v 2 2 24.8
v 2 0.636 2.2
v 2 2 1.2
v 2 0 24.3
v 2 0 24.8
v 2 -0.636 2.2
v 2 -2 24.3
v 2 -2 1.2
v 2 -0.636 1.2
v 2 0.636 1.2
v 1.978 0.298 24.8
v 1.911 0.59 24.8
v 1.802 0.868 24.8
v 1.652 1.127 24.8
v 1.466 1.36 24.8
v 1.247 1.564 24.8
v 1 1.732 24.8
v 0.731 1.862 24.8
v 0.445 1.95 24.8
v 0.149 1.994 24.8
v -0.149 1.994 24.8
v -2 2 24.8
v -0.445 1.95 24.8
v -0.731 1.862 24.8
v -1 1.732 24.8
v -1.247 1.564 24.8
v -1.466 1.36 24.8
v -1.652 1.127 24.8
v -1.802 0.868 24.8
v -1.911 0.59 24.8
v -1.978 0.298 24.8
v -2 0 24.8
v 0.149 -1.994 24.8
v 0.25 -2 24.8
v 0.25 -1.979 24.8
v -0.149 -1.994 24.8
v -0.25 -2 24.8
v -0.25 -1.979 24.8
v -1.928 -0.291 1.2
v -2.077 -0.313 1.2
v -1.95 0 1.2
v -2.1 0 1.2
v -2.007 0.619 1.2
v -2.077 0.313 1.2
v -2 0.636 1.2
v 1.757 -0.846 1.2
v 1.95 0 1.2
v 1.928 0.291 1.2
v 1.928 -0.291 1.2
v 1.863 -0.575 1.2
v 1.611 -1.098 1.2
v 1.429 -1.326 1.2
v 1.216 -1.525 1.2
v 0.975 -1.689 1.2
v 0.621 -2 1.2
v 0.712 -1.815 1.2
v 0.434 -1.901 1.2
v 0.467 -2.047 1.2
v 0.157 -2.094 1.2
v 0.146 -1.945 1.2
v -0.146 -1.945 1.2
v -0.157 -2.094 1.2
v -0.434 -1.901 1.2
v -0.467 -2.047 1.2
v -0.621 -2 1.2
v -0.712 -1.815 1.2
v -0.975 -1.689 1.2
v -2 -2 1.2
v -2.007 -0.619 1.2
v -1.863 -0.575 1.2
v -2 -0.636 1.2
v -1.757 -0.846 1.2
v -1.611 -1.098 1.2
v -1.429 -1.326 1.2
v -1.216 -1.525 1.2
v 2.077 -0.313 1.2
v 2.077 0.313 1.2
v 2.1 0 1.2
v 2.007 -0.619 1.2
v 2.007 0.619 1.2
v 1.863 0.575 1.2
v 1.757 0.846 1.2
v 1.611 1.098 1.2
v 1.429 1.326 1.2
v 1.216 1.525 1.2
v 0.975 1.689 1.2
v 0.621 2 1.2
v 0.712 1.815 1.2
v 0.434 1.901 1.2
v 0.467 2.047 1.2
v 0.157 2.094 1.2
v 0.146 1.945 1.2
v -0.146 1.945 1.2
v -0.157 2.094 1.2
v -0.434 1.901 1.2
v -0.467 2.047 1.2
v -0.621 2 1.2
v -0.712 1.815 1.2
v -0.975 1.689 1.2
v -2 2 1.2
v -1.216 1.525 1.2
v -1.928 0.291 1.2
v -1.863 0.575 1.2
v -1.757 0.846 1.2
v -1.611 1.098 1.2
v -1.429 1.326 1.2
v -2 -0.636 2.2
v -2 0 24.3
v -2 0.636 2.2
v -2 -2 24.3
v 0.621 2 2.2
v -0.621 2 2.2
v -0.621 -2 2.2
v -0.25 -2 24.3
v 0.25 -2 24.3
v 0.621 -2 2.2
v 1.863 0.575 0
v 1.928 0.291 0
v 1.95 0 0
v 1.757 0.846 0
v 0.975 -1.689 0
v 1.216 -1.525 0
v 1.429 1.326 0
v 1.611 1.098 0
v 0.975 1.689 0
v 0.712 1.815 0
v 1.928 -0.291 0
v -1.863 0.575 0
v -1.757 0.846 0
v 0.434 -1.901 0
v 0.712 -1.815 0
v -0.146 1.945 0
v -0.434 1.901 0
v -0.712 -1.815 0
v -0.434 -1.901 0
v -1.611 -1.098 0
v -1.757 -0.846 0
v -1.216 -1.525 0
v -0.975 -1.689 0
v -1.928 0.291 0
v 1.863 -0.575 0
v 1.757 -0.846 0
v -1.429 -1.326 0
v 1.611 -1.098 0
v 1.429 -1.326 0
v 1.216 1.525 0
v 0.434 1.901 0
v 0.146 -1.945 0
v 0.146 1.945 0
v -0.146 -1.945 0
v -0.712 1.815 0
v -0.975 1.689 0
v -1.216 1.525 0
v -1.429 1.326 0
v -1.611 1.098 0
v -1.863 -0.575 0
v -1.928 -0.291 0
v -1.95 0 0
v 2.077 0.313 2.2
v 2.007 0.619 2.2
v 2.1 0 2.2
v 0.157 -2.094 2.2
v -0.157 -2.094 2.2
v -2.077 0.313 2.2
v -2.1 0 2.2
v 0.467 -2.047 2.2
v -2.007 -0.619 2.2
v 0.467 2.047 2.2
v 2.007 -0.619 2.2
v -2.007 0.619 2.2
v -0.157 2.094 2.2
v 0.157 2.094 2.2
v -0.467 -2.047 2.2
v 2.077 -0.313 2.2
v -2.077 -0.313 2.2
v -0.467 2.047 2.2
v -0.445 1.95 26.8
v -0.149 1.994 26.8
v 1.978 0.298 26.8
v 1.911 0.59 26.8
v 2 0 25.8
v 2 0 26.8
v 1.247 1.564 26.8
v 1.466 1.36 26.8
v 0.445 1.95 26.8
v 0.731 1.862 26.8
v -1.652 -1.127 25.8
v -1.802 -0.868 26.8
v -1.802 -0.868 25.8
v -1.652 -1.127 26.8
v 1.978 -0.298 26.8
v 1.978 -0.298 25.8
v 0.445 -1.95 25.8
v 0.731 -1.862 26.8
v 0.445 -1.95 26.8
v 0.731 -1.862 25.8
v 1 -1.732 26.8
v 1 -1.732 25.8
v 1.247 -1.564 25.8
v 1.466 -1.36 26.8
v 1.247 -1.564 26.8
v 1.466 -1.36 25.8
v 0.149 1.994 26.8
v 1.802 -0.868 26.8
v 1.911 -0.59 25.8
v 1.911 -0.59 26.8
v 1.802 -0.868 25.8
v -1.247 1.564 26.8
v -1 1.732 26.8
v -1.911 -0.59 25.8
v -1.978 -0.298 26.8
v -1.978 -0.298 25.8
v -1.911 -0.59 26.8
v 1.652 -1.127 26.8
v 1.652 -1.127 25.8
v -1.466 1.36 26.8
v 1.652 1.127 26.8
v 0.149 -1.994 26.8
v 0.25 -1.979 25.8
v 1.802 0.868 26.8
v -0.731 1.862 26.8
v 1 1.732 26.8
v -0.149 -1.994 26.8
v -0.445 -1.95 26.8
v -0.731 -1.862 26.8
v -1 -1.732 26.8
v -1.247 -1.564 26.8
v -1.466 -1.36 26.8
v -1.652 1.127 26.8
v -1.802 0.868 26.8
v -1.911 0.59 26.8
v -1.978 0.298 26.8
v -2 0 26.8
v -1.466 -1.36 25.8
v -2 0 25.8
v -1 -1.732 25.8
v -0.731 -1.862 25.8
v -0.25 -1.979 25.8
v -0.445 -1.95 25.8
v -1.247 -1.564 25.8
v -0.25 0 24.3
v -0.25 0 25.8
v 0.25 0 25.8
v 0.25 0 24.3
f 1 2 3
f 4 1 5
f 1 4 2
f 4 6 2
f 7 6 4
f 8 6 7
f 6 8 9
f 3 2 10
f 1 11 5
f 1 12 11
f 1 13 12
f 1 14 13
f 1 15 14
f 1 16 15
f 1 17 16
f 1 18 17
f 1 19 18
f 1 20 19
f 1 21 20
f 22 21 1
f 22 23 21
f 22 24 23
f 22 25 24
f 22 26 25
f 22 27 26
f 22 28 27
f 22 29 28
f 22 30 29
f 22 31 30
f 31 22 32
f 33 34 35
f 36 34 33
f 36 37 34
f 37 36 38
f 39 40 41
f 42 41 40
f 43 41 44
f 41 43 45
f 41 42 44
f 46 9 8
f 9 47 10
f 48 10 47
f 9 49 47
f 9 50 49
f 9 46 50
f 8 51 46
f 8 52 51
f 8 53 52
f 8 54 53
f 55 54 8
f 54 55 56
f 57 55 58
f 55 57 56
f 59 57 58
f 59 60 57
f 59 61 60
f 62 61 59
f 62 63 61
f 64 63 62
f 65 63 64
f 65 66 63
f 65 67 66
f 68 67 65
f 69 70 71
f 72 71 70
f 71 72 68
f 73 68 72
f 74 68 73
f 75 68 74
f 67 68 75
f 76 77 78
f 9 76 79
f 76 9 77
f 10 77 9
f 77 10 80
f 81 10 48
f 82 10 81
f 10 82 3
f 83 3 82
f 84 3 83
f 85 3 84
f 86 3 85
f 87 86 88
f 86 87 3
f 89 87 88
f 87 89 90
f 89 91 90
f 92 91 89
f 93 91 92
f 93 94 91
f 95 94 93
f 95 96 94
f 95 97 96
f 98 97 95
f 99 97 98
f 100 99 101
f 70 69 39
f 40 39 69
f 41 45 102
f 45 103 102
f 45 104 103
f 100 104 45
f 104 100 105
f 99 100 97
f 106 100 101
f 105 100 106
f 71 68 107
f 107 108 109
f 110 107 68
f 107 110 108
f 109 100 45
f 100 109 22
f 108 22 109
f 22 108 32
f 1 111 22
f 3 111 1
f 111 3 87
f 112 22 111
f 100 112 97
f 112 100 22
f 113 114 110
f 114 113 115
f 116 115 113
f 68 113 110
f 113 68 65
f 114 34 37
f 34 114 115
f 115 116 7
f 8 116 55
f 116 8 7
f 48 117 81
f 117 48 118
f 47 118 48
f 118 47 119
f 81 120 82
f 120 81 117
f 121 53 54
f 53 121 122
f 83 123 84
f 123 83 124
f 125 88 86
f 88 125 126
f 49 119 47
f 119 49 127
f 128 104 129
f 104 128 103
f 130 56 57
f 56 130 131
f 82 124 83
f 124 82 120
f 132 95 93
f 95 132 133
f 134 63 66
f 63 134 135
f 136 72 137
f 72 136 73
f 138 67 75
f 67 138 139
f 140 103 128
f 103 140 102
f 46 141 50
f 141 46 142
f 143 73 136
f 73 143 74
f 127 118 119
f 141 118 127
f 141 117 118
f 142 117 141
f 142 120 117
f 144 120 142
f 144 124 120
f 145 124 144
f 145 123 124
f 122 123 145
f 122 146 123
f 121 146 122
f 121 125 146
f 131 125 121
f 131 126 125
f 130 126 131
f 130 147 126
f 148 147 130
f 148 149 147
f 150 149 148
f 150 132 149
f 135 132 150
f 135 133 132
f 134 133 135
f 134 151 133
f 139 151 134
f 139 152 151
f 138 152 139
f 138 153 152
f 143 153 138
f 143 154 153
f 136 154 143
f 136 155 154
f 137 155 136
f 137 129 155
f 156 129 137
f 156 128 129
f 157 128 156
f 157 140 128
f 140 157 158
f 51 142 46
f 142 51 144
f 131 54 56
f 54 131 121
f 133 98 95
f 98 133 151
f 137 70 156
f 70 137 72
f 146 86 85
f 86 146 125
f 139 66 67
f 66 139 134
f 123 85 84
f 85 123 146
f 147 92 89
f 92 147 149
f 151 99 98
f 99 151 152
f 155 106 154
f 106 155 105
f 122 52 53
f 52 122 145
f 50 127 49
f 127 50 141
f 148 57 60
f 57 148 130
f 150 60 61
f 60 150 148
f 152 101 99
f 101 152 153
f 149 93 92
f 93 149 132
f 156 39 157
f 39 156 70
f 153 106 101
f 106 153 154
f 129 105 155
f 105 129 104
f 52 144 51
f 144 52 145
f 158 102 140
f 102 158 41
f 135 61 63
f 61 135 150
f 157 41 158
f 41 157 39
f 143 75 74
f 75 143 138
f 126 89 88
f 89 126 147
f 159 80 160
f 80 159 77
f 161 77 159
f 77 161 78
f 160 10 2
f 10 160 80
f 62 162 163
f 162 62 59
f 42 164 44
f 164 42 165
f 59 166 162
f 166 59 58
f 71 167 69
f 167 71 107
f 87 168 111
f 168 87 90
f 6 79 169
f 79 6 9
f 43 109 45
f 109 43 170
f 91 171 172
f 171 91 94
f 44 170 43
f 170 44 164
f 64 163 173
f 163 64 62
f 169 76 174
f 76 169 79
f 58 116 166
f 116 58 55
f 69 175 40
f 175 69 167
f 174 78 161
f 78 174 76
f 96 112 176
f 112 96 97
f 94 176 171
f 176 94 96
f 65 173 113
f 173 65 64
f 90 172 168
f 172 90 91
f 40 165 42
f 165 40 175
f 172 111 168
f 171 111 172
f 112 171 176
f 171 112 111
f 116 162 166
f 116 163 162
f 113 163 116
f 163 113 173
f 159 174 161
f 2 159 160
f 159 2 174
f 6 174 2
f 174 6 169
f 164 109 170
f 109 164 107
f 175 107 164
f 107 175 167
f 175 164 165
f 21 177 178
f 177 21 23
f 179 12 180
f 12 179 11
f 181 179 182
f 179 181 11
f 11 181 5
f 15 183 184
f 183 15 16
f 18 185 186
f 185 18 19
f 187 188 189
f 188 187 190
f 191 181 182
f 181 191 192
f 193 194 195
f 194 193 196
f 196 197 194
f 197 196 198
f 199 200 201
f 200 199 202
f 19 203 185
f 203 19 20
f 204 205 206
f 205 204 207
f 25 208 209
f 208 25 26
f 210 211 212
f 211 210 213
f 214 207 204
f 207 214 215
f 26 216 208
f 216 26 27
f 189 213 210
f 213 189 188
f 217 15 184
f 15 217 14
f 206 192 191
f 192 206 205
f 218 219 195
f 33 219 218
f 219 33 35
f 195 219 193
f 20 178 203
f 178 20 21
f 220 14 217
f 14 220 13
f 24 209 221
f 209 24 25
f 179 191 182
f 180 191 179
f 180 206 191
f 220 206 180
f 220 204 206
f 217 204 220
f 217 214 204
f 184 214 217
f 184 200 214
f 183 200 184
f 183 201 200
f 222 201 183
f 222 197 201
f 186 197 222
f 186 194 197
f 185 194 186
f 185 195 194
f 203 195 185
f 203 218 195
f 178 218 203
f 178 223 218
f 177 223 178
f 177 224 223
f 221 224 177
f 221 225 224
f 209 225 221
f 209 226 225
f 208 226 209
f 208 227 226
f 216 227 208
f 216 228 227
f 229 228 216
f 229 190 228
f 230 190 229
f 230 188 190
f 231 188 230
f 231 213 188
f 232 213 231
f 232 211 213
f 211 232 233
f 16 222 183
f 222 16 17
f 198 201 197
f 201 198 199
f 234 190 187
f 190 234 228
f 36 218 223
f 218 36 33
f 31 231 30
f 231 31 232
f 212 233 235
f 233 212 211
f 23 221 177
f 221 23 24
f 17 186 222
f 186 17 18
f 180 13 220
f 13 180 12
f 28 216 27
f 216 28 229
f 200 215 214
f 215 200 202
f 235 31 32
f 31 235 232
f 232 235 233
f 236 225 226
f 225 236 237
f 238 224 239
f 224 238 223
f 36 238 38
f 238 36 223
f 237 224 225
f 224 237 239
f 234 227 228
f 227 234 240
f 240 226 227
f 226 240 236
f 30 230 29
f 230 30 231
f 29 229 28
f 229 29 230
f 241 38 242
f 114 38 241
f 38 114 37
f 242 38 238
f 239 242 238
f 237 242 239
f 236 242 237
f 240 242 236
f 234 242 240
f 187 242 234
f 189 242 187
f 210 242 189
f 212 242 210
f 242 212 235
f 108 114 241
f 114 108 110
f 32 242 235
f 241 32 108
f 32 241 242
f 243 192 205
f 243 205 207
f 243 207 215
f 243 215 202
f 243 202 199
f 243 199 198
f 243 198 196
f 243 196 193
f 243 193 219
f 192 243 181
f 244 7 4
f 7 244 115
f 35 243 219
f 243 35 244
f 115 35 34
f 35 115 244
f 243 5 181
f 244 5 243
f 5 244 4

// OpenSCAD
// part_id: b5
// name: B5 fitted post
// source_drawing_ids: DRW-002
// units: mm
// revision: 0.1
// SPDX-License-Identifier: MIT

// Main body axis is +Z.
module part_b5(body_w = 4.0, body_d = 4.0, body_h = 23.6,
               top_stub_d = 4.0, top_stub_h = 2.0,
               bottom_stub_d = 3.9, bottom_stub_h = 1.2,
               collar_d = 4.2, collar_h = 1.0,
               side_flat = 1.75) {
    difference() {
        union() {
            // Main square body.
            translate([-body_w / 2, -body_d / 2, bottom_stub_h])
                cube([body_w, body_d, body_h], center = false);

            // Bottom fitted stem + collar.
            cylinder(d = bottom_stub_d, h = bottom_stub_h, center = false, $fn = 42);
            translate([0, 0, bottom_stub_h])
                cylinder(d = collar_d, h = collar_h, center = false, $fn = 42);

            // Top rounded stem.
            translate([0, 0, bottom_stub_h + body_h])
                cylinder(d = top_stub_d, h = top_stub_h, center = false, $fn = 42);
        }

        // Opposed flats on top stem (keyed profile shown in section views).
        for (sx = [-1, 1])
            translate([sx * (top_stub_d / 2 - side_flat / 2), -3, bottom_stub_h + body_h + 0.25])
                cube([side_flat, 6, top_stub_h - 0.5], center = true);
    }
}

// ---- "main guard" ----
// Default to previewing when opened directly:
if (is_undef(__LIB_MODE__)) {
    part_b5();
}
